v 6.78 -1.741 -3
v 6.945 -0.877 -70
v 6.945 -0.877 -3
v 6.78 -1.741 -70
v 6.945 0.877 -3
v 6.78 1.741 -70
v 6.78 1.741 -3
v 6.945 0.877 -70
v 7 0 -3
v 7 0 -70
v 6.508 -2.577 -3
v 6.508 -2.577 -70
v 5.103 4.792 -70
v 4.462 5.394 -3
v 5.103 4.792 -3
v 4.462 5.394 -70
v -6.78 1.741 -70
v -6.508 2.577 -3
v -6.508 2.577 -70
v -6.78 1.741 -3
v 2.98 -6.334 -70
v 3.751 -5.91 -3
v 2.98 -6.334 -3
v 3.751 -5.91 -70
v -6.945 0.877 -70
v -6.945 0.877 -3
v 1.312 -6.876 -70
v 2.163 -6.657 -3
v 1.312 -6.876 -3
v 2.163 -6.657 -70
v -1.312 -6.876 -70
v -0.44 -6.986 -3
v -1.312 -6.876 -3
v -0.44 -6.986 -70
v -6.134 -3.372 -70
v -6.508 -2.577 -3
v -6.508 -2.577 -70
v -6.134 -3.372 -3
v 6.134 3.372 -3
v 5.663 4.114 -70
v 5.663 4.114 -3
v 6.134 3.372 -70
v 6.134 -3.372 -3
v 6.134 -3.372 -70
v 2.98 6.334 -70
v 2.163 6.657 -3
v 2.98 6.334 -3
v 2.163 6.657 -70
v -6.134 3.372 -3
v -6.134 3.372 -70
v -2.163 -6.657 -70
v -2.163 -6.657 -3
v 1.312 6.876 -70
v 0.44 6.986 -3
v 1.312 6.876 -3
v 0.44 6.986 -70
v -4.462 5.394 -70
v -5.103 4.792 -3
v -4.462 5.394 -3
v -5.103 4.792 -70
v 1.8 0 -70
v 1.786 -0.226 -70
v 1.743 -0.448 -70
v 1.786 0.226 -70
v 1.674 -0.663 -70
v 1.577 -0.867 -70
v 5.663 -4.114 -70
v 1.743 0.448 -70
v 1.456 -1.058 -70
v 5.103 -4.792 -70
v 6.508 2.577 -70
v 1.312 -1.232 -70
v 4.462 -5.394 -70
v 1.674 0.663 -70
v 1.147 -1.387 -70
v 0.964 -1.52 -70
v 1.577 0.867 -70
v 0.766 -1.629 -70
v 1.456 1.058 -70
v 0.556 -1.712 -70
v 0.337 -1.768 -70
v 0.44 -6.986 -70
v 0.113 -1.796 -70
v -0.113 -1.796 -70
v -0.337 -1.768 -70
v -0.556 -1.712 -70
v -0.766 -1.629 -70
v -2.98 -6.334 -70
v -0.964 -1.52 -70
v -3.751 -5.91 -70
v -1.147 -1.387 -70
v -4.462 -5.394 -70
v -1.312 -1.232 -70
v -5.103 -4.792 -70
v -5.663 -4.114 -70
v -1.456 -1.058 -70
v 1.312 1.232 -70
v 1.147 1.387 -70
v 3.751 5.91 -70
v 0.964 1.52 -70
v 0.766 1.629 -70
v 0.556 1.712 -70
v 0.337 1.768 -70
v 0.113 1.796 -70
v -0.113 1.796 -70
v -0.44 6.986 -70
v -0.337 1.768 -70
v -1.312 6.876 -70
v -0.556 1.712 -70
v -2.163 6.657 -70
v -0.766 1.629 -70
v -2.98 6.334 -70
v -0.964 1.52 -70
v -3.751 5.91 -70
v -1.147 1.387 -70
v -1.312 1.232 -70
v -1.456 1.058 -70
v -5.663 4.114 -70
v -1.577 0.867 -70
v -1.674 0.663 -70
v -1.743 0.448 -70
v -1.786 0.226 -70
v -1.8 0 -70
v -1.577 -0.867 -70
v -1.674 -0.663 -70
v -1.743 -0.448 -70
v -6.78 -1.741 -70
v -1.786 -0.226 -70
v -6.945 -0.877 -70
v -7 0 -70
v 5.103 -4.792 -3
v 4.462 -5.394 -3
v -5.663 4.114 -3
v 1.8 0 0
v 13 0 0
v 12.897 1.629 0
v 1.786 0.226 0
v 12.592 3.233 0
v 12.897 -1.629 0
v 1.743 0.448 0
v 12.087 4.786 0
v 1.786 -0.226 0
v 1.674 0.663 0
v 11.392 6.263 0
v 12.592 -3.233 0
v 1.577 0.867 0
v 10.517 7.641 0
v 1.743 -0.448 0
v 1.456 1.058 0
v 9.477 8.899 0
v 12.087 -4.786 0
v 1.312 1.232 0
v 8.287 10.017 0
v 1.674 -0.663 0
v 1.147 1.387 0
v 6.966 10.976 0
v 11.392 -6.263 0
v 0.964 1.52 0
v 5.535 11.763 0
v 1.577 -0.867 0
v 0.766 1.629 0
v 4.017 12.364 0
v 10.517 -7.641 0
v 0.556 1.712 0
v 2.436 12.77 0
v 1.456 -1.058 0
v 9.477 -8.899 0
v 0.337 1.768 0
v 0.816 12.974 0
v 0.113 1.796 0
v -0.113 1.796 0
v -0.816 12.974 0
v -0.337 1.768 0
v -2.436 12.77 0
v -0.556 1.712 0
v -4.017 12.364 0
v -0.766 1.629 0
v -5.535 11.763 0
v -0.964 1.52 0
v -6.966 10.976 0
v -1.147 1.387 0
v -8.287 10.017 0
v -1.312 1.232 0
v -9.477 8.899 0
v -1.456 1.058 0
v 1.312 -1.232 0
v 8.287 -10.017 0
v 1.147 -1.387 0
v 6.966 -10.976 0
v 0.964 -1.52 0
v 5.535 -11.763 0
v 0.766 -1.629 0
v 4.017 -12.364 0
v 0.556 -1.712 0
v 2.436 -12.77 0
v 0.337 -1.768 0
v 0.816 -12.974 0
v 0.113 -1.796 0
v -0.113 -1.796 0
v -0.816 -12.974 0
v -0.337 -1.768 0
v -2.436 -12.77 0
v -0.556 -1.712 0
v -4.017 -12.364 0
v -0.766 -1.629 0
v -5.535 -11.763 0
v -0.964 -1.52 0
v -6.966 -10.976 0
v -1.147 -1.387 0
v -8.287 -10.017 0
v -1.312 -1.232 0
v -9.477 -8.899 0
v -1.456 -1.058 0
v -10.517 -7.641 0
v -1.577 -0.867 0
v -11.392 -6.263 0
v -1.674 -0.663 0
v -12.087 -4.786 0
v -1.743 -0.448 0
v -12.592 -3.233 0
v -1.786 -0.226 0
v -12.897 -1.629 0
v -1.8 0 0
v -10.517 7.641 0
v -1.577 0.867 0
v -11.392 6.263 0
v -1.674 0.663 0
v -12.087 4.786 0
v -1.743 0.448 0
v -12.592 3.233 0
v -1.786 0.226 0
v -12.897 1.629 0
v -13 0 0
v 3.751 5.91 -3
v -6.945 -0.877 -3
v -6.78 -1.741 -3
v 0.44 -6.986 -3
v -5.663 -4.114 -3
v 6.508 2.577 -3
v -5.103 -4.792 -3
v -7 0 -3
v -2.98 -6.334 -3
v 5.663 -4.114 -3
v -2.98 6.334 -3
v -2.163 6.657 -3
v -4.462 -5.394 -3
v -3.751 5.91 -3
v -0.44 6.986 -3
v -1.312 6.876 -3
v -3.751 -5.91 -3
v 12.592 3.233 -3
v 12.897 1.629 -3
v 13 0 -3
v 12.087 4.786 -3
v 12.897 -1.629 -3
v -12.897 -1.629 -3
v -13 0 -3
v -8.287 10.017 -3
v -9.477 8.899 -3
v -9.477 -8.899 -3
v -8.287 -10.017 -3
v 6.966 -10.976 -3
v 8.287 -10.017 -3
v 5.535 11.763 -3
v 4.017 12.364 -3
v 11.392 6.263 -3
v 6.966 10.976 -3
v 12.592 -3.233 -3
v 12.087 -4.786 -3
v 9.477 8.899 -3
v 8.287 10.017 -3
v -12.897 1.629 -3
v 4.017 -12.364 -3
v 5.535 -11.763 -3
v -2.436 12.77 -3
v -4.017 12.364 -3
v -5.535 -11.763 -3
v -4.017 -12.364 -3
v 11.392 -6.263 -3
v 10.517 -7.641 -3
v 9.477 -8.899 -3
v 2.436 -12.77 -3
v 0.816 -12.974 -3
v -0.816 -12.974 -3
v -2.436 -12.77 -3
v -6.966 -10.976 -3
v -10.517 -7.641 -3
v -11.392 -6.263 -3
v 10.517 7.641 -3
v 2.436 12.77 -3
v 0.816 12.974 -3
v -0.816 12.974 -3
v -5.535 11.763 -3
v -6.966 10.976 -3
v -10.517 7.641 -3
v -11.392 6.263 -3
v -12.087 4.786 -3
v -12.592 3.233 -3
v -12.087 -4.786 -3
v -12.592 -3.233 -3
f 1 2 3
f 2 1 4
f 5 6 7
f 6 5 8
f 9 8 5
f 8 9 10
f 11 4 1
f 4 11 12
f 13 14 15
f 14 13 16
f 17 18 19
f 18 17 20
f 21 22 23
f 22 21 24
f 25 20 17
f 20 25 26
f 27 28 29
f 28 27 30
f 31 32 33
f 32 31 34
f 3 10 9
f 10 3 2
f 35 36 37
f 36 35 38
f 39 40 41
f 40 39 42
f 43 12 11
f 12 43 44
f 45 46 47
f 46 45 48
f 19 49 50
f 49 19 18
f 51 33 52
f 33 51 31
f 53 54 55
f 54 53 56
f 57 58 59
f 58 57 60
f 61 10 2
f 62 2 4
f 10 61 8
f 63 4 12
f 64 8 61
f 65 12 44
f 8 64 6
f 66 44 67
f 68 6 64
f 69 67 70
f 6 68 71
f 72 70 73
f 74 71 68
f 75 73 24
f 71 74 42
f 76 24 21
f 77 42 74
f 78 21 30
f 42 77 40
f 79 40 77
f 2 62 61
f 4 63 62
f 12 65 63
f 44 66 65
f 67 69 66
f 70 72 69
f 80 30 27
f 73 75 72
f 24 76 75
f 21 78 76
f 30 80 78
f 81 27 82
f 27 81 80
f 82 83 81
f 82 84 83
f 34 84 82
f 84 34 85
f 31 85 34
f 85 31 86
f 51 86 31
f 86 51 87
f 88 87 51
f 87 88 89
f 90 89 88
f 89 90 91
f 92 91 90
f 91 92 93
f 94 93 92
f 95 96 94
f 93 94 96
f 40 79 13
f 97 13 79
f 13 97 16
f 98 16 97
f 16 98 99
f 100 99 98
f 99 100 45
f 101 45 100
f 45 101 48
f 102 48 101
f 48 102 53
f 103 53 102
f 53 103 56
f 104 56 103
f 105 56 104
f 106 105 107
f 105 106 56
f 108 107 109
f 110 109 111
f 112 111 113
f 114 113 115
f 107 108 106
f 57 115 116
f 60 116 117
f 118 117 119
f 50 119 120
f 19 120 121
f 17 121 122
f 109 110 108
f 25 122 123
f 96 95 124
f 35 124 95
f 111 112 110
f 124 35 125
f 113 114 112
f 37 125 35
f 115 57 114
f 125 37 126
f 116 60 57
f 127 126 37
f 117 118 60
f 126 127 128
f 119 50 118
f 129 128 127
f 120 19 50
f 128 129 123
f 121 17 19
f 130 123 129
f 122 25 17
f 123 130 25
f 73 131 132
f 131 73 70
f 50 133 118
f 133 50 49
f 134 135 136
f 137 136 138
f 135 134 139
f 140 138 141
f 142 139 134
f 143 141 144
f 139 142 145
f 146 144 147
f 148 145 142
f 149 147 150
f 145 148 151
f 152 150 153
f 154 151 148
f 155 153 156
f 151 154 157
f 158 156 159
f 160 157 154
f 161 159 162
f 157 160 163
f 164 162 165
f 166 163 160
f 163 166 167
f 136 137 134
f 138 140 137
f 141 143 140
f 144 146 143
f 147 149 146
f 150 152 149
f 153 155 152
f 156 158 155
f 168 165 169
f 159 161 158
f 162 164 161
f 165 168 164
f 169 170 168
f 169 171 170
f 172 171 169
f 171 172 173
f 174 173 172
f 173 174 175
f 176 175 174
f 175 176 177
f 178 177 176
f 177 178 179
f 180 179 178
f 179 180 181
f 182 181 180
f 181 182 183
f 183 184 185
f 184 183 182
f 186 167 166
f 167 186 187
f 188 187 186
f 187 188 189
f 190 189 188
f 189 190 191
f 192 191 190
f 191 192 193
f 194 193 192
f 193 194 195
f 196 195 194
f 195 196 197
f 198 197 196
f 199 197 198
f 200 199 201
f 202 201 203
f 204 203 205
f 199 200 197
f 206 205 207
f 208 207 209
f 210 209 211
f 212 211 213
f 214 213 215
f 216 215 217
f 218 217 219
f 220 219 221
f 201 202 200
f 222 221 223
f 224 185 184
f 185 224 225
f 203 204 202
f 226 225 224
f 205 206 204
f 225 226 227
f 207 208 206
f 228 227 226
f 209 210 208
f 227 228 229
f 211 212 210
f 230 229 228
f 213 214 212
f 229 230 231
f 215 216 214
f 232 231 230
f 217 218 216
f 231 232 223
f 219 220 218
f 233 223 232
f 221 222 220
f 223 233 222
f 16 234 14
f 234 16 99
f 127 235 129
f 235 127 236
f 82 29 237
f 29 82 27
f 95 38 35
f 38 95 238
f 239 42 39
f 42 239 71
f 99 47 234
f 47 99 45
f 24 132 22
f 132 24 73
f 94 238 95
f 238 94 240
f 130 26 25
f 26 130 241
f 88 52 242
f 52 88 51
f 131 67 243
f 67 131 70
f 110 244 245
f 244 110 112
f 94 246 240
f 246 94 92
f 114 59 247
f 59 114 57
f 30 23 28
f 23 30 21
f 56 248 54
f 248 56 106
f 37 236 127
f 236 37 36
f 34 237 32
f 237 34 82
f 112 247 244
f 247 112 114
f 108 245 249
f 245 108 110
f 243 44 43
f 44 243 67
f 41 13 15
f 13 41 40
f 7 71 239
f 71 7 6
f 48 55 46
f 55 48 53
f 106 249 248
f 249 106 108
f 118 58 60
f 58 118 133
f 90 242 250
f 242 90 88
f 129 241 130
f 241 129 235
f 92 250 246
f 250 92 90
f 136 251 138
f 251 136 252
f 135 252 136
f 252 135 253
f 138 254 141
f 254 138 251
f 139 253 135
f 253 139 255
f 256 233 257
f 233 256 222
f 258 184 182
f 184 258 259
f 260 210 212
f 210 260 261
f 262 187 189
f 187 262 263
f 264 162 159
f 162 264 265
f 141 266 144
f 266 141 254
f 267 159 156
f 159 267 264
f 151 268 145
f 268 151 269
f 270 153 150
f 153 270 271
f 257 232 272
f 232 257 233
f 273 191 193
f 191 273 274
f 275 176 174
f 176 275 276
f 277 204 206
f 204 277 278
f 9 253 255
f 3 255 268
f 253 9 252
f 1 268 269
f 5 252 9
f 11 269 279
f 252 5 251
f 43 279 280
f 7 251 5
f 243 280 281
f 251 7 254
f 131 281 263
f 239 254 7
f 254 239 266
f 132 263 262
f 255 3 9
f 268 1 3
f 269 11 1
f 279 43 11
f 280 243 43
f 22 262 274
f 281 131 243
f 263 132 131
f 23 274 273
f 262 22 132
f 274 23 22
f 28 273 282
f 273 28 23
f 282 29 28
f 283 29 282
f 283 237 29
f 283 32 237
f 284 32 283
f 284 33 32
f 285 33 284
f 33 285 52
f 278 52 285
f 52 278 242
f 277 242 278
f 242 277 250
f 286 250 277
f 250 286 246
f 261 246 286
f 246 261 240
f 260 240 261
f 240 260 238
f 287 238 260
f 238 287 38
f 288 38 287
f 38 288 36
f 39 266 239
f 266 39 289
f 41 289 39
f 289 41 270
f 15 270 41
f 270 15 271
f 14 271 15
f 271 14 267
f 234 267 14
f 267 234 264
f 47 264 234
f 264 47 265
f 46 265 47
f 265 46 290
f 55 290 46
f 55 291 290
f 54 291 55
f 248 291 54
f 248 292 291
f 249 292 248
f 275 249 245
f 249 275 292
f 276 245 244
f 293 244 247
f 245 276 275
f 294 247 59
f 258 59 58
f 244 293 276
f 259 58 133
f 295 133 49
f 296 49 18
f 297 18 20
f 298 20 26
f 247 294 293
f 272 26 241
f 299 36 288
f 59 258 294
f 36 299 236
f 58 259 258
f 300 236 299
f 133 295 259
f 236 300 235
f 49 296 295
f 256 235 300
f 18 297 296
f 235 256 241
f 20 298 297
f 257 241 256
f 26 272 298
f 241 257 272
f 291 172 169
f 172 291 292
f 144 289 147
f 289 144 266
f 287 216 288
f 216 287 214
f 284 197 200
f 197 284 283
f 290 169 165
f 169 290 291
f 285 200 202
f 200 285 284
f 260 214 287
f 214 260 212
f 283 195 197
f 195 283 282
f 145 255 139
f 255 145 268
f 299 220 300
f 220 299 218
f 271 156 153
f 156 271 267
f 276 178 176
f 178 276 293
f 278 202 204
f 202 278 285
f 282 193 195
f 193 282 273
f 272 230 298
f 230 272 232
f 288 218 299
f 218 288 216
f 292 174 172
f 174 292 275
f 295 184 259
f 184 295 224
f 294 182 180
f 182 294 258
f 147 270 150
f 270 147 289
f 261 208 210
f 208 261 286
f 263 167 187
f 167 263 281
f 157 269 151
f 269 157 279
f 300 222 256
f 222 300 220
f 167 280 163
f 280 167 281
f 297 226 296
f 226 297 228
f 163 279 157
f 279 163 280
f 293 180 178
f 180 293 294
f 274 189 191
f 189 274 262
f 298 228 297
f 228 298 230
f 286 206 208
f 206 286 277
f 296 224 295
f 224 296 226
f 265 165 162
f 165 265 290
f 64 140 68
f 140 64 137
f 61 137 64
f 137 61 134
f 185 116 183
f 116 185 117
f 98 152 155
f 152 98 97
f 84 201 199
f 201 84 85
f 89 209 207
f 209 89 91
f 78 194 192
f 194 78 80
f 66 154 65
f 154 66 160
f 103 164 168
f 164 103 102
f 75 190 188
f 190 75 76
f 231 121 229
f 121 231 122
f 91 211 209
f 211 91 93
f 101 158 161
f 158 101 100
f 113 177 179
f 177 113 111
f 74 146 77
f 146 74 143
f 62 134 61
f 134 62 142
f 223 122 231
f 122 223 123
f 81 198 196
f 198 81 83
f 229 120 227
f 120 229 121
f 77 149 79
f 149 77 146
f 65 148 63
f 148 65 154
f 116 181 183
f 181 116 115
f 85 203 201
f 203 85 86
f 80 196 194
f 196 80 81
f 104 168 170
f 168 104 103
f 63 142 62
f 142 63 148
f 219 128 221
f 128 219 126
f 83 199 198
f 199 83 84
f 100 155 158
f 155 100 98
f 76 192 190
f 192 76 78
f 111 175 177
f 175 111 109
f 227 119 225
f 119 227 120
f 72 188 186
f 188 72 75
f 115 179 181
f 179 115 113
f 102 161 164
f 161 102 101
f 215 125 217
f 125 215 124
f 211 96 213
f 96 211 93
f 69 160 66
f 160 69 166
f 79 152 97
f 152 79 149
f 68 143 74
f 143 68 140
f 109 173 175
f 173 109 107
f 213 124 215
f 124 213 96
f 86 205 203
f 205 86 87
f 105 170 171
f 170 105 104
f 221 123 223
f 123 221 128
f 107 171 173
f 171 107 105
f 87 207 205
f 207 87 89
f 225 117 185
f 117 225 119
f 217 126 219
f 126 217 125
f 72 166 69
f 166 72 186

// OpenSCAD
$fn = 50;


difference() {
	union() {
		translate(v = [0, 0, -70.0000000000]) {
			cylinder(h = 70, r = 7.0000000000);
		}
		translate(v = [0, 0, -3.0000000000]) {
			cylinder(h = 3, r = 13.0000000000);
		}
	}
	union() {
		#translate(v = [0, 0, -70]) {
			cylinder(h = 70, r = 1.8000000000);
		}
	}
}
